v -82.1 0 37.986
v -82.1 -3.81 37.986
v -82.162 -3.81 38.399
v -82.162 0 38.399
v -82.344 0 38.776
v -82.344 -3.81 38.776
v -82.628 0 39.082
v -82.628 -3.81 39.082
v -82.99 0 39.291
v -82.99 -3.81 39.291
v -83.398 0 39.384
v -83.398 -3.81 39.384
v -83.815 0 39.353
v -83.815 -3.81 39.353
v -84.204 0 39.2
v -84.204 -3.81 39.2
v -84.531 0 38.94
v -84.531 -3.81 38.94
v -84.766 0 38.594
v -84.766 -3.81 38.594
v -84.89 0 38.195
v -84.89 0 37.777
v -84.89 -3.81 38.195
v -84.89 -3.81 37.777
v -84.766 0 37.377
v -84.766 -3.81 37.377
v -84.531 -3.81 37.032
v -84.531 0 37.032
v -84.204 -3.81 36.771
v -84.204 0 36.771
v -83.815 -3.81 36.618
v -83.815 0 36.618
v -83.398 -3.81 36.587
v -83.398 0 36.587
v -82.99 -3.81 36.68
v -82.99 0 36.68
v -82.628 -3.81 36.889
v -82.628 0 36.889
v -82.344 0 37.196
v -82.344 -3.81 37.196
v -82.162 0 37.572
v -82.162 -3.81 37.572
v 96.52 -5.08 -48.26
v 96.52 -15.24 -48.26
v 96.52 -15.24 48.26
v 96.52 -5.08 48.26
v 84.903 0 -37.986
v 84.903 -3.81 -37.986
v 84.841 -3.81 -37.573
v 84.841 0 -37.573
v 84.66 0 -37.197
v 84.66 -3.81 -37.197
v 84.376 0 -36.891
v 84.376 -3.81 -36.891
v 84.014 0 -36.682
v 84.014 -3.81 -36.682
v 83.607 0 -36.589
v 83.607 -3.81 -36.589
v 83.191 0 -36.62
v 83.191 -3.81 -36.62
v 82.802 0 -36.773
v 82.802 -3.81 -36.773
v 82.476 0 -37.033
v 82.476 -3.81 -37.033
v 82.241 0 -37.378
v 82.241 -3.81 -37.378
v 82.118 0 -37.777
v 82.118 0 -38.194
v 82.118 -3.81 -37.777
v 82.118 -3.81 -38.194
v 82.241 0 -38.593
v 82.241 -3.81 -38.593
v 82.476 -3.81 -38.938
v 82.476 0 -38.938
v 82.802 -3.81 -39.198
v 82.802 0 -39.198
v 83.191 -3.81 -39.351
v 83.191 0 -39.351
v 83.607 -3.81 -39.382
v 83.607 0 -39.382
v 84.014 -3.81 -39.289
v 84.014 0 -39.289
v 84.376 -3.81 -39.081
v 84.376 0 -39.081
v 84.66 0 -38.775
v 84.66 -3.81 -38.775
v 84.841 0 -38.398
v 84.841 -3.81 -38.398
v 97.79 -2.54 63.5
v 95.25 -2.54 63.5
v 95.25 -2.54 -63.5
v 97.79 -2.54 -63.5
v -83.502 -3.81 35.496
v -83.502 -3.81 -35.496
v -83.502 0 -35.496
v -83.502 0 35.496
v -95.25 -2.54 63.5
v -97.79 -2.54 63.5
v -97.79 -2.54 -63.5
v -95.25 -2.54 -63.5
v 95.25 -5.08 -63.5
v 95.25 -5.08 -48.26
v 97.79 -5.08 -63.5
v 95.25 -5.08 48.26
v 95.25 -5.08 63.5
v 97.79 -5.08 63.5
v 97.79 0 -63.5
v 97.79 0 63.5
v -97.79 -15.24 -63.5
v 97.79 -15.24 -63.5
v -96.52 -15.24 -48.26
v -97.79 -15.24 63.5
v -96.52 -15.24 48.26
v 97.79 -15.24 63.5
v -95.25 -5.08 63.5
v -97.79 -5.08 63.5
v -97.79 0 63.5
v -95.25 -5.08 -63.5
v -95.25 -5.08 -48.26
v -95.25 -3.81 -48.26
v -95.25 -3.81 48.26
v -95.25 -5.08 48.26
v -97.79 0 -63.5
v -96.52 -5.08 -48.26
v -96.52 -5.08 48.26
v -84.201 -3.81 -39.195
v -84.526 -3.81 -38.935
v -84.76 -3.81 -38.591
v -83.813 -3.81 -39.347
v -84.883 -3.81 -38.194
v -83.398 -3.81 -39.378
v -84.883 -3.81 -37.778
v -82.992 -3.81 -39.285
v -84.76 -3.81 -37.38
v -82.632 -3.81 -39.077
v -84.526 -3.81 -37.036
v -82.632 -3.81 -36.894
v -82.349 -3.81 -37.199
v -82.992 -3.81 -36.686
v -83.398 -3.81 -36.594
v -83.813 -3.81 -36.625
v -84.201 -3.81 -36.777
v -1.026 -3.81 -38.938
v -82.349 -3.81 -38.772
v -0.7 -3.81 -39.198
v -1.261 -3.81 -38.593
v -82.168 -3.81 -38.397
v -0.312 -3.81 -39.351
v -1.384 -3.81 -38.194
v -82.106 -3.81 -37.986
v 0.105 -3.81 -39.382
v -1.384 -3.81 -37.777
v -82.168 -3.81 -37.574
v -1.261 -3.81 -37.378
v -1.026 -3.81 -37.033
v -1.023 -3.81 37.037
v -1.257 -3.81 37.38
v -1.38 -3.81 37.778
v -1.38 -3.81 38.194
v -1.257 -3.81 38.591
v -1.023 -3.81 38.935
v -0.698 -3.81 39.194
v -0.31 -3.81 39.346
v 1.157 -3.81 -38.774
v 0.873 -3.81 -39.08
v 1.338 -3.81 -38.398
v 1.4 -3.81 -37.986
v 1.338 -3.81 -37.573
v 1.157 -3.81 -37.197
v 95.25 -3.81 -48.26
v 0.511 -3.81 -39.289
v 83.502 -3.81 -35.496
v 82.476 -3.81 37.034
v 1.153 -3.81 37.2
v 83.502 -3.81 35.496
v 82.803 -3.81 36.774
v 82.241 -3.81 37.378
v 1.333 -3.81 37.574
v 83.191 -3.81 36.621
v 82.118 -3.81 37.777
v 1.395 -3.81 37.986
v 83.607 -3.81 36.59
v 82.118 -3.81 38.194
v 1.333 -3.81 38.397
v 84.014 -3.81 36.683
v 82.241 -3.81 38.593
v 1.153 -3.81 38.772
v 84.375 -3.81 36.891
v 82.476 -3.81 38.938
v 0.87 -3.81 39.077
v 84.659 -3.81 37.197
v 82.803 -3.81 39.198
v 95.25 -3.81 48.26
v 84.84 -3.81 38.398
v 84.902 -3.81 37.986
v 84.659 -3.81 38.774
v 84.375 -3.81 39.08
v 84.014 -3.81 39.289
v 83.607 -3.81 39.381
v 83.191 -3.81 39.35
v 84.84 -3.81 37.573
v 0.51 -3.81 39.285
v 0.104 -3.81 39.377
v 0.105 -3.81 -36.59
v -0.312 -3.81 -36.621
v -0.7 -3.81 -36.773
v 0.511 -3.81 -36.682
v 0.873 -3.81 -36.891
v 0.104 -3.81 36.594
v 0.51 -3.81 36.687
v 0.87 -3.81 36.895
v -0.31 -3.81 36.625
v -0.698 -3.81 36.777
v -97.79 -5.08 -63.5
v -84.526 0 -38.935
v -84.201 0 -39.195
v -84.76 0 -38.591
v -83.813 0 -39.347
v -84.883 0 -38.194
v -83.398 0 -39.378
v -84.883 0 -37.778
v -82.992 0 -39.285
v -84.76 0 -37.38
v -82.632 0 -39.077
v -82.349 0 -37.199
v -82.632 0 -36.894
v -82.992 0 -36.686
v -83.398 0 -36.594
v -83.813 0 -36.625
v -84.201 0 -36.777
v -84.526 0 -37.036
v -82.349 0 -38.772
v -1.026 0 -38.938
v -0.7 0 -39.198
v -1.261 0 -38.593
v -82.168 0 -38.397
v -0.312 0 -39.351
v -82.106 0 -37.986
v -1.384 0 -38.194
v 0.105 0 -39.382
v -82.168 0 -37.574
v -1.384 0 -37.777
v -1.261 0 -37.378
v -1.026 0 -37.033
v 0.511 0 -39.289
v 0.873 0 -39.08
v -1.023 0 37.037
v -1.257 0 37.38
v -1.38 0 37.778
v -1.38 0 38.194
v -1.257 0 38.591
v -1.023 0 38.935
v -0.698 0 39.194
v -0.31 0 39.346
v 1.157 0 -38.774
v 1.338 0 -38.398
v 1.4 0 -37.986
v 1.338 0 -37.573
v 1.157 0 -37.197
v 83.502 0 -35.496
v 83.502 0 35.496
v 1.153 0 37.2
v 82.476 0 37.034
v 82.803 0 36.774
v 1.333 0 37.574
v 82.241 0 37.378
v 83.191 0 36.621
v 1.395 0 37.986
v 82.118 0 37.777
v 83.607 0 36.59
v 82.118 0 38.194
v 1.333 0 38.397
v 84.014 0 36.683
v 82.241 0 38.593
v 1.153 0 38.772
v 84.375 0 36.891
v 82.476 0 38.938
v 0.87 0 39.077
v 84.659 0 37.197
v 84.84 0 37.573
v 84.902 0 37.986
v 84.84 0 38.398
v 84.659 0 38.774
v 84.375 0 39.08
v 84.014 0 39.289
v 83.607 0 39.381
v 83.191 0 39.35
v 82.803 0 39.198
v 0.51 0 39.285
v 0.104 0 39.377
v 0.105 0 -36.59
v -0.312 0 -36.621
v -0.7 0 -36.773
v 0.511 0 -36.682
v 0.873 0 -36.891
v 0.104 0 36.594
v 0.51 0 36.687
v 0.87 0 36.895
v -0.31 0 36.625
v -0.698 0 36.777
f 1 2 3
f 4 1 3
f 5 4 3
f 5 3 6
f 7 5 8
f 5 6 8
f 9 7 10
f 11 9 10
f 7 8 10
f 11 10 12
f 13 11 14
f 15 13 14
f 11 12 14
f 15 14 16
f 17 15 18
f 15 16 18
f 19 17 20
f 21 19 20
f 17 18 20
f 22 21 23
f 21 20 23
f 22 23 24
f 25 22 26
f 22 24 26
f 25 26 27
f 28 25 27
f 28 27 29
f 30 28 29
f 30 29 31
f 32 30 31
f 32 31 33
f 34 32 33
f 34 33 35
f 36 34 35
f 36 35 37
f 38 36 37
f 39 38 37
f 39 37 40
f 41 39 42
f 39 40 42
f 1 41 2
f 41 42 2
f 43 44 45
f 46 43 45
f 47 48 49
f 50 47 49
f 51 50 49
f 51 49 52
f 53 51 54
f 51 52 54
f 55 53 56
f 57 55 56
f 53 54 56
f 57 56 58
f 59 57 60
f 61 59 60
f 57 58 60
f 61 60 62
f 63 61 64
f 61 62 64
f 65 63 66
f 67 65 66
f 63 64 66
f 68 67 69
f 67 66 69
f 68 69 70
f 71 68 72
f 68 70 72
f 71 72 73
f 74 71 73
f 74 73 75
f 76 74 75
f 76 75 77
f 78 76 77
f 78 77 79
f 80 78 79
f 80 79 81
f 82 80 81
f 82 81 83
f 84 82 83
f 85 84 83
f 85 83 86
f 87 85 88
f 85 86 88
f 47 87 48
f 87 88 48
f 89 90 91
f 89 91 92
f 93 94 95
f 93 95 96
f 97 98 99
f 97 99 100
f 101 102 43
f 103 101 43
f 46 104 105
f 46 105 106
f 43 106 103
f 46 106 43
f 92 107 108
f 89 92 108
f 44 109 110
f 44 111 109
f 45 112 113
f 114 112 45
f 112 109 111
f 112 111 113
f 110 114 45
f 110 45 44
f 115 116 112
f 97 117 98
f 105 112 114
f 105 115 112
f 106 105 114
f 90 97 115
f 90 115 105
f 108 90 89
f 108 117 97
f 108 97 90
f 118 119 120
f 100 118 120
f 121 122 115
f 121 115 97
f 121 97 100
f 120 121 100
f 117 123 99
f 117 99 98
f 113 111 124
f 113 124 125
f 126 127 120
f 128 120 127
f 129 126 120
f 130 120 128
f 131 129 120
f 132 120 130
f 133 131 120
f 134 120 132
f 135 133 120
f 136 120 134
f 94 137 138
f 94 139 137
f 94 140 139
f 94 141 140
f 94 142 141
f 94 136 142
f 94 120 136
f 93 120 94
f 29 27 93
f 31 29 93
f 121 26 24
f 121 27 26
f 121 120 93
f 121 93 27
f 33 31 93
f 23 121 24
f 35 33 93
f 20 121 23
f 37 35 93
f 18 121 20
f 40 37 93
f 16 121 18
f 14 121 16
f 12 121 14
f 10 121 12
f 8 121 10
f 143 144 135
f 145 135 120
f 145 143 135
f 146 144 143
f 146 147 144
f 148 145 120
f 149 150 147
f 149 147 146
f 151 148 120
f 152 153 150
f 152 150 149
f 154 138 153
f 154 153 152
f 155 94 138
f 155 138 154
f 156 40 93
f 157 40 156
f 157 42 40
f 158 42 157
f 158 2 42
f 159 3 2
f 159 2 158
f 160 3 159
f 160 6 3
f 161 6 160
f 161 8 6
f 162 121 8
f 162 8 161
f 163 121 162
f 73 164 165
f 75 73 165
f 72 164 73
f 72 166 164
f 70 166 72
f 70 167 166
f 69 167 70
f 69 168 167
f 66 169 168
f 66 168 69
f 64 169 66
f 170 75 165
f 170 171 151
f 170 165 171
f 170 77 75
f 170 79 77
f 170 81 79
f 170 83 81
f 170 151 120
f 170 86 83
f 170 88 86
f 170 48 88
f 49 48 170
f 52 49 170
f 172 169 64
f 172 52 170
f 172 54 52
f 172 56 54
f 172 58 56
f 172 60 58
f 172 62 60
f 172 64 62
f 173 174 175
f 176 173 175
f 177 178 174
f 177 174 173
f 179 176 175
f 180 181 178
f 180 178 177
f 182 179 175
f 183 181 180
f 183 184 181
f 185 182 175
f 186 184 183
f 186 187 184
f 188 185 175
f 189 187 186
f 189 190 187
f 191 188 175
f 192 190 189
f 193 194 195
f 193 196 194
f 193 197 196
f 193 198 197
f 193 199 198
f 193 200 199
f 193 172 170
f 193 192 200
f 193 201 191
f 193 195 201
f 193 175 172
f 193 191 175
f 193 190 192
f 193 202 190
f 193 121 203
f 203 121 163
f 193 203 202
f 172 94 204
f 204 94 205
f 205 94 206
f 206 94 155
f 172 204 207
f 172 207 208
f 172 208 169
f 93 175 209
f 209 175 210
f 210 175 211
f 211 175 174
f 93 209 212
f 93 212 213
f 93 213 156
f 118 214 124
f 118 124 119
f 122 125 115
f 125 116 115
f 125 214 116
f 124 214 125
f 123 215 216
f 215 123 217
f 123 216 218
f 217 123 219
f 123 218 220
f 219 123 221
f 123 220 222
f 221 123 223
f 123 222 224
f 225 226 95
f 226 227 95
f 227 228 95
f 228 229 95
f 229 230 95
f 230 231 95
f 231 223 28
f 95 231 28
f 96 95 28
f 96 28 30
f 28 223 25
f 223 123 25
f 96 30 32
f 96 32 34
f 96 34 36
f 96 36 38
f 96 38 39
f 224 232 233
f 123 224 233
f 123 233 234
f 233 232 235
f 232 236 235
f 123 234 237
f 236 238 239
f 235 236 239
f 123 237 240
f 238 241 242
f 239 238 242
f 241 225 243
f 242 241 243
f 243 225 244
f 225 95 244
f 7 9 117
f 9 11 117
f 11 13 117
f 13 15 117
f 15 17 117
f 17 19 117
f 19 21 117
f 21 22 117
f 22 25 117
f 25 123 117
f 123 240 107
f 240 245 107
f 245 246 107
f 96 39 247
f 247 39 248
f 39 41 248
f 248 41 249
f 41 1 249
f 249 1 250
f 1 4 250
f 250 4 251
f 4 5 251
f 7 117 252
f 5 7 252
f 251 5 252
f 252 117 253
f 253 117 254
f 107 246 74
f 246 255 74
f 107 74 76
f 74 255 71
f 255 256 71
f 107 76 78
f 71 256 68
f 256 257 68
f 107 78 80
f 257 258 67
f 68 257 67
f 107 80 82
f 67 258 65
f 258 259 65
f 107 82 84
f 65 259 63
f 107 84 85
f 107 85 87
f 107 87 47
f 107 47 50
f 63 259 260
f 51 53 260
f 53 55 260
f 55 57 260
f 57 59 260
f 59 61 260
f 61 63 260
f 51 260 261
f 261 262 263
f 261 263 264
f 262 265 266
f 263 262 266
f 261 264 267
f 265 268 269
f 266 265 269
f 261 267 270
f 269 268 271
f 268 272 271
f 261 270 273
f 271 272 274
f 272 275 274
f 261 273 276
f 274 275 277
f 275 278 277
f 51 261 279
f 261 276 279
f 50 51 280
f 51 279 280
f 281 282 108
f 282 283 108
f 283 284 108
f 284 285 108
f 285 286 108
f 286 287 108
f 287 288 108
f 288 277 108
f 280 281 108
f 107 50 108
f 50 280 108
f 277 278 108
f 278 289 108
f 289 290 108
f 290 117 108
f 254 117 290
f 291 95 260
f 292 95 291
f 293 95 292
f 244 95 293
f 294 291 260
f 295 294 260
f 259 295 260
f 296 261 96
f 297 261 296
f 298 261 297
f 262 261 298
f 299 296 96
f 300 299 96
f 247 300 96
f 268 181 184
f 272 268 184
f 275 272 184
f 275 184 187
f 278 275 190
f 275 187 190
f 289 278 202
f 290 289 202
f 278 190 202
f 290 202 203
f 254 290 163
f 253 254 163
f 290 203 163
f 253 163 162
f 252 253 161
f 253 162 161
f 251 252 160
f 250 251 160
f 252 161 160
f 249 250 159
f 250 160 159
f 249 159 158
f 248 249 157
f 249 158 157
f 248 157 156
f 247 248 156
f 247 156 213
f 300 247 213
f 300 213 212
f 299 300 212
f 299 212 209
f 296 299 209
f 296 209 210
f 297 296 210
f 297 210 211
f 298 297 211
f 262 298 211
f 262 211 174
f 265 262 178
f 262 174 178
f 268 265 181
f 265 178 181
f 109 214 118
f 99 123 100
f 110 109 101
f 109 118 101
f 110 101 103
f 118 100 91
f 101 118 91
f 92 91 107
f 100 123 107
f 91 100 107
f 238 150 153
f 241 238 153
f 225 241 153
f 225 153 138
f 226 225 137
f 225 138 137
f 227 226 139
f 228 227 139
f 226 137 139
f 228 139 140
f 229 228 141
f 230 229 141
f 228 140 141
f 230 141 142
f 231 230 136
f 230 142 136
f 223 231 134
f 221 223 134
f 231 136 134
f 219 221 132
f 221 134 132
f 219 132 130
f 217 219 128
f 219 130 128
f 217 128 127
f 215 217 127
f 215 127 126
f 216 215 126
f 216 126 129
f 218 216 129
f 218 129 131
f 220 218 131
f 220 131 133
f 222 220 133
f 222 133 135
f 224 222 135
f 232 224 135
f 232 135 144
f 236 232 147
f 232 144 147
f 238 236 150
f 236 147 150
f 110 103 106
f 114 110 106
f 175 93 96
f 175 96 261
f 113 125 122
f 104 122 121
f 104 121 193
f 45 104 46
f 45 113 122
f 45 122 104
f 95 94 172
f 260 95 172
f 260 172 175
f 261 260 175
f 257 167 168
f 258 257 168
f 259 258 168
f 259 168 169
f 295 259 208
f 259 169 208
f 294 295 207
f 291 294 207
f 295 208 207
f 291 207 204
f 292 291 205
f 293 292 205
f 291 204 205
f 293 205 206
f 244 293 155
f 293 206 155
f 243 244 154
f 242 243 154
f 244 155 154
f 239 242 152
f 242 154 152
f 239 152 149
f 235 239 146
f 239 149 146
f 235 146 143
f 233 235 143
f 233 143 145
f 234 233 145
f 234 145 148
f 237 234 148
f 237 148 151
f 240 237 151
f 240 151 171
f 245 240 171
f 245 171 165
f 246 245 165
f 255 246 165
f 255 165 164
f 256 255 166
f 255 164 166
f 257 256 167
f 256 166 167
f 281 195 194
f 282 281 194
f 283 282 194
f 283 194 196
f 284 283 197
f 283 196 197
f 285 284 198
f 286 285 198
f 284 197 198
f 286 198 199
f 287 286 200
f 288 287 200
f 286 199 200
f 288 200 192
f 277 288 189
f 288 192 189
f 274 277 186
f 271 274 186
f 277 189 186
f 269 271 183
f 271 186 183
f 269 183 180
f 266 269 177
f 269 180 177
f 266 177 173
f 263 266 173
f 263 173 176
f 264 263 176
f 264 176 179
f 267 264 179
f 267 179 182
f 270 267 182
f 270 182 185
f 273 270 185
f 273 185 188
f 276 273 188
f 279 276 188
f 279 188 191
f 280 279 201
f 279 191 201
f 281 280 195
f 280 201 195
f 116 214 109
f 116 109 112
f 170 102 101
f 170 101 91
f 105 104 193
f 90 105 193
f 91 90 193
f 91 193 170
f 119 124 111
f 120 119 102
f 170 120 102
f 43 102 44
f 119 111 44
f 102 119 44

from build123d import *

# Parameters (mm, degrees)
F0_W      = 195.58
F0_H      = 127
F1_DEPTH  = 15.24
F2_W      = 2.54
F2_H      = 2.54
F3_DEPTH  = 127
F4_W      = 167.005
F4_H      = 70.993
F5_DEPTH  = 15.24
F6_W      = 172.085
F6_H      = 79.629
F7_DEPTH  = 11.43
F8_R      = 1.395268
F8_R_2    = 1.40268
F8_R_3    = 1.396073
F8_R_4    = 1.400056
F8_R_5    = 1.400396
F8_R_6    = 1.399702
F9_DEPTH  = 3.81
F10_W     = 193.04
F10_H     = 96.52
F11_DEPTH = 11.43


with BuildPart() as f1:
    # F0 (on Front) → F1 (new body)
    with BuildSketch(Plane.XZ):
        Rectangle(F0_W, F0_H)
    extrude(amount=F1_DEPTH)

    # F2 (on face) → F3 (cut)
    with BuildSketch(Plane.XY.offset(63.5)):
        with Locations((-96.52, -3.81)):
            Rectangle(F2_W, F2_H)
        with Locations((96.52, -3.81)):
            Rectangle(F2_W, F2_H)
    extrude(amount=-F3_DEPTH, mode=Mode.SUBTRACT)

    # F4 (on face) → F5 (cut)
    with BuildSketch(Plane.XZ.offset(15.24)):
        Rectangle(F4_W, F4_H)
    extrude(amount=-F5_DEPTH, mode=Mode.SUBTRACT)

    # F6 (on face) → F7 (cut)
    with BuildSketch(Plane.XZ.offset(15.24)):
        Rectangle(F6_W, F6_H)
    extrude(amount=-F7_DEPTH, mode=Mode.SUBTRACT)

    # F8 (on face) → F9 (cut)
    with BuildSketch(Plane.XZ.offset(3.81)):
        with Locations((0, 37.9857)):
            Circle(F8_R)
        with Locations((-83.5025, 37.9857)):
            Circle(F8_R_2)
        with Locations((-83.5025, -37.9857)):
            Circle(F8_R_3)
        with Locations((0, -37.9857)):
            Circle(F8_R_4)
        with Locations((83.5025, -37.9857)):
            Circle(F8_R_5)
        with Locations((83.5025, 37.9857)):
            Circle(F8_R_6)
    extrude(amount=-F9_DEPTH, mode=Mode.SUBTRACT)

    # F10 (on face) → F11 (cut)
    with BuildSketch(Plane.XZ.offset(15.24)):
        Rectangle(F10_W, F10_H)
    extrude(amount=-F11_DEPTH, mode=Mode.SUBTRACT)


solid = f1.part
